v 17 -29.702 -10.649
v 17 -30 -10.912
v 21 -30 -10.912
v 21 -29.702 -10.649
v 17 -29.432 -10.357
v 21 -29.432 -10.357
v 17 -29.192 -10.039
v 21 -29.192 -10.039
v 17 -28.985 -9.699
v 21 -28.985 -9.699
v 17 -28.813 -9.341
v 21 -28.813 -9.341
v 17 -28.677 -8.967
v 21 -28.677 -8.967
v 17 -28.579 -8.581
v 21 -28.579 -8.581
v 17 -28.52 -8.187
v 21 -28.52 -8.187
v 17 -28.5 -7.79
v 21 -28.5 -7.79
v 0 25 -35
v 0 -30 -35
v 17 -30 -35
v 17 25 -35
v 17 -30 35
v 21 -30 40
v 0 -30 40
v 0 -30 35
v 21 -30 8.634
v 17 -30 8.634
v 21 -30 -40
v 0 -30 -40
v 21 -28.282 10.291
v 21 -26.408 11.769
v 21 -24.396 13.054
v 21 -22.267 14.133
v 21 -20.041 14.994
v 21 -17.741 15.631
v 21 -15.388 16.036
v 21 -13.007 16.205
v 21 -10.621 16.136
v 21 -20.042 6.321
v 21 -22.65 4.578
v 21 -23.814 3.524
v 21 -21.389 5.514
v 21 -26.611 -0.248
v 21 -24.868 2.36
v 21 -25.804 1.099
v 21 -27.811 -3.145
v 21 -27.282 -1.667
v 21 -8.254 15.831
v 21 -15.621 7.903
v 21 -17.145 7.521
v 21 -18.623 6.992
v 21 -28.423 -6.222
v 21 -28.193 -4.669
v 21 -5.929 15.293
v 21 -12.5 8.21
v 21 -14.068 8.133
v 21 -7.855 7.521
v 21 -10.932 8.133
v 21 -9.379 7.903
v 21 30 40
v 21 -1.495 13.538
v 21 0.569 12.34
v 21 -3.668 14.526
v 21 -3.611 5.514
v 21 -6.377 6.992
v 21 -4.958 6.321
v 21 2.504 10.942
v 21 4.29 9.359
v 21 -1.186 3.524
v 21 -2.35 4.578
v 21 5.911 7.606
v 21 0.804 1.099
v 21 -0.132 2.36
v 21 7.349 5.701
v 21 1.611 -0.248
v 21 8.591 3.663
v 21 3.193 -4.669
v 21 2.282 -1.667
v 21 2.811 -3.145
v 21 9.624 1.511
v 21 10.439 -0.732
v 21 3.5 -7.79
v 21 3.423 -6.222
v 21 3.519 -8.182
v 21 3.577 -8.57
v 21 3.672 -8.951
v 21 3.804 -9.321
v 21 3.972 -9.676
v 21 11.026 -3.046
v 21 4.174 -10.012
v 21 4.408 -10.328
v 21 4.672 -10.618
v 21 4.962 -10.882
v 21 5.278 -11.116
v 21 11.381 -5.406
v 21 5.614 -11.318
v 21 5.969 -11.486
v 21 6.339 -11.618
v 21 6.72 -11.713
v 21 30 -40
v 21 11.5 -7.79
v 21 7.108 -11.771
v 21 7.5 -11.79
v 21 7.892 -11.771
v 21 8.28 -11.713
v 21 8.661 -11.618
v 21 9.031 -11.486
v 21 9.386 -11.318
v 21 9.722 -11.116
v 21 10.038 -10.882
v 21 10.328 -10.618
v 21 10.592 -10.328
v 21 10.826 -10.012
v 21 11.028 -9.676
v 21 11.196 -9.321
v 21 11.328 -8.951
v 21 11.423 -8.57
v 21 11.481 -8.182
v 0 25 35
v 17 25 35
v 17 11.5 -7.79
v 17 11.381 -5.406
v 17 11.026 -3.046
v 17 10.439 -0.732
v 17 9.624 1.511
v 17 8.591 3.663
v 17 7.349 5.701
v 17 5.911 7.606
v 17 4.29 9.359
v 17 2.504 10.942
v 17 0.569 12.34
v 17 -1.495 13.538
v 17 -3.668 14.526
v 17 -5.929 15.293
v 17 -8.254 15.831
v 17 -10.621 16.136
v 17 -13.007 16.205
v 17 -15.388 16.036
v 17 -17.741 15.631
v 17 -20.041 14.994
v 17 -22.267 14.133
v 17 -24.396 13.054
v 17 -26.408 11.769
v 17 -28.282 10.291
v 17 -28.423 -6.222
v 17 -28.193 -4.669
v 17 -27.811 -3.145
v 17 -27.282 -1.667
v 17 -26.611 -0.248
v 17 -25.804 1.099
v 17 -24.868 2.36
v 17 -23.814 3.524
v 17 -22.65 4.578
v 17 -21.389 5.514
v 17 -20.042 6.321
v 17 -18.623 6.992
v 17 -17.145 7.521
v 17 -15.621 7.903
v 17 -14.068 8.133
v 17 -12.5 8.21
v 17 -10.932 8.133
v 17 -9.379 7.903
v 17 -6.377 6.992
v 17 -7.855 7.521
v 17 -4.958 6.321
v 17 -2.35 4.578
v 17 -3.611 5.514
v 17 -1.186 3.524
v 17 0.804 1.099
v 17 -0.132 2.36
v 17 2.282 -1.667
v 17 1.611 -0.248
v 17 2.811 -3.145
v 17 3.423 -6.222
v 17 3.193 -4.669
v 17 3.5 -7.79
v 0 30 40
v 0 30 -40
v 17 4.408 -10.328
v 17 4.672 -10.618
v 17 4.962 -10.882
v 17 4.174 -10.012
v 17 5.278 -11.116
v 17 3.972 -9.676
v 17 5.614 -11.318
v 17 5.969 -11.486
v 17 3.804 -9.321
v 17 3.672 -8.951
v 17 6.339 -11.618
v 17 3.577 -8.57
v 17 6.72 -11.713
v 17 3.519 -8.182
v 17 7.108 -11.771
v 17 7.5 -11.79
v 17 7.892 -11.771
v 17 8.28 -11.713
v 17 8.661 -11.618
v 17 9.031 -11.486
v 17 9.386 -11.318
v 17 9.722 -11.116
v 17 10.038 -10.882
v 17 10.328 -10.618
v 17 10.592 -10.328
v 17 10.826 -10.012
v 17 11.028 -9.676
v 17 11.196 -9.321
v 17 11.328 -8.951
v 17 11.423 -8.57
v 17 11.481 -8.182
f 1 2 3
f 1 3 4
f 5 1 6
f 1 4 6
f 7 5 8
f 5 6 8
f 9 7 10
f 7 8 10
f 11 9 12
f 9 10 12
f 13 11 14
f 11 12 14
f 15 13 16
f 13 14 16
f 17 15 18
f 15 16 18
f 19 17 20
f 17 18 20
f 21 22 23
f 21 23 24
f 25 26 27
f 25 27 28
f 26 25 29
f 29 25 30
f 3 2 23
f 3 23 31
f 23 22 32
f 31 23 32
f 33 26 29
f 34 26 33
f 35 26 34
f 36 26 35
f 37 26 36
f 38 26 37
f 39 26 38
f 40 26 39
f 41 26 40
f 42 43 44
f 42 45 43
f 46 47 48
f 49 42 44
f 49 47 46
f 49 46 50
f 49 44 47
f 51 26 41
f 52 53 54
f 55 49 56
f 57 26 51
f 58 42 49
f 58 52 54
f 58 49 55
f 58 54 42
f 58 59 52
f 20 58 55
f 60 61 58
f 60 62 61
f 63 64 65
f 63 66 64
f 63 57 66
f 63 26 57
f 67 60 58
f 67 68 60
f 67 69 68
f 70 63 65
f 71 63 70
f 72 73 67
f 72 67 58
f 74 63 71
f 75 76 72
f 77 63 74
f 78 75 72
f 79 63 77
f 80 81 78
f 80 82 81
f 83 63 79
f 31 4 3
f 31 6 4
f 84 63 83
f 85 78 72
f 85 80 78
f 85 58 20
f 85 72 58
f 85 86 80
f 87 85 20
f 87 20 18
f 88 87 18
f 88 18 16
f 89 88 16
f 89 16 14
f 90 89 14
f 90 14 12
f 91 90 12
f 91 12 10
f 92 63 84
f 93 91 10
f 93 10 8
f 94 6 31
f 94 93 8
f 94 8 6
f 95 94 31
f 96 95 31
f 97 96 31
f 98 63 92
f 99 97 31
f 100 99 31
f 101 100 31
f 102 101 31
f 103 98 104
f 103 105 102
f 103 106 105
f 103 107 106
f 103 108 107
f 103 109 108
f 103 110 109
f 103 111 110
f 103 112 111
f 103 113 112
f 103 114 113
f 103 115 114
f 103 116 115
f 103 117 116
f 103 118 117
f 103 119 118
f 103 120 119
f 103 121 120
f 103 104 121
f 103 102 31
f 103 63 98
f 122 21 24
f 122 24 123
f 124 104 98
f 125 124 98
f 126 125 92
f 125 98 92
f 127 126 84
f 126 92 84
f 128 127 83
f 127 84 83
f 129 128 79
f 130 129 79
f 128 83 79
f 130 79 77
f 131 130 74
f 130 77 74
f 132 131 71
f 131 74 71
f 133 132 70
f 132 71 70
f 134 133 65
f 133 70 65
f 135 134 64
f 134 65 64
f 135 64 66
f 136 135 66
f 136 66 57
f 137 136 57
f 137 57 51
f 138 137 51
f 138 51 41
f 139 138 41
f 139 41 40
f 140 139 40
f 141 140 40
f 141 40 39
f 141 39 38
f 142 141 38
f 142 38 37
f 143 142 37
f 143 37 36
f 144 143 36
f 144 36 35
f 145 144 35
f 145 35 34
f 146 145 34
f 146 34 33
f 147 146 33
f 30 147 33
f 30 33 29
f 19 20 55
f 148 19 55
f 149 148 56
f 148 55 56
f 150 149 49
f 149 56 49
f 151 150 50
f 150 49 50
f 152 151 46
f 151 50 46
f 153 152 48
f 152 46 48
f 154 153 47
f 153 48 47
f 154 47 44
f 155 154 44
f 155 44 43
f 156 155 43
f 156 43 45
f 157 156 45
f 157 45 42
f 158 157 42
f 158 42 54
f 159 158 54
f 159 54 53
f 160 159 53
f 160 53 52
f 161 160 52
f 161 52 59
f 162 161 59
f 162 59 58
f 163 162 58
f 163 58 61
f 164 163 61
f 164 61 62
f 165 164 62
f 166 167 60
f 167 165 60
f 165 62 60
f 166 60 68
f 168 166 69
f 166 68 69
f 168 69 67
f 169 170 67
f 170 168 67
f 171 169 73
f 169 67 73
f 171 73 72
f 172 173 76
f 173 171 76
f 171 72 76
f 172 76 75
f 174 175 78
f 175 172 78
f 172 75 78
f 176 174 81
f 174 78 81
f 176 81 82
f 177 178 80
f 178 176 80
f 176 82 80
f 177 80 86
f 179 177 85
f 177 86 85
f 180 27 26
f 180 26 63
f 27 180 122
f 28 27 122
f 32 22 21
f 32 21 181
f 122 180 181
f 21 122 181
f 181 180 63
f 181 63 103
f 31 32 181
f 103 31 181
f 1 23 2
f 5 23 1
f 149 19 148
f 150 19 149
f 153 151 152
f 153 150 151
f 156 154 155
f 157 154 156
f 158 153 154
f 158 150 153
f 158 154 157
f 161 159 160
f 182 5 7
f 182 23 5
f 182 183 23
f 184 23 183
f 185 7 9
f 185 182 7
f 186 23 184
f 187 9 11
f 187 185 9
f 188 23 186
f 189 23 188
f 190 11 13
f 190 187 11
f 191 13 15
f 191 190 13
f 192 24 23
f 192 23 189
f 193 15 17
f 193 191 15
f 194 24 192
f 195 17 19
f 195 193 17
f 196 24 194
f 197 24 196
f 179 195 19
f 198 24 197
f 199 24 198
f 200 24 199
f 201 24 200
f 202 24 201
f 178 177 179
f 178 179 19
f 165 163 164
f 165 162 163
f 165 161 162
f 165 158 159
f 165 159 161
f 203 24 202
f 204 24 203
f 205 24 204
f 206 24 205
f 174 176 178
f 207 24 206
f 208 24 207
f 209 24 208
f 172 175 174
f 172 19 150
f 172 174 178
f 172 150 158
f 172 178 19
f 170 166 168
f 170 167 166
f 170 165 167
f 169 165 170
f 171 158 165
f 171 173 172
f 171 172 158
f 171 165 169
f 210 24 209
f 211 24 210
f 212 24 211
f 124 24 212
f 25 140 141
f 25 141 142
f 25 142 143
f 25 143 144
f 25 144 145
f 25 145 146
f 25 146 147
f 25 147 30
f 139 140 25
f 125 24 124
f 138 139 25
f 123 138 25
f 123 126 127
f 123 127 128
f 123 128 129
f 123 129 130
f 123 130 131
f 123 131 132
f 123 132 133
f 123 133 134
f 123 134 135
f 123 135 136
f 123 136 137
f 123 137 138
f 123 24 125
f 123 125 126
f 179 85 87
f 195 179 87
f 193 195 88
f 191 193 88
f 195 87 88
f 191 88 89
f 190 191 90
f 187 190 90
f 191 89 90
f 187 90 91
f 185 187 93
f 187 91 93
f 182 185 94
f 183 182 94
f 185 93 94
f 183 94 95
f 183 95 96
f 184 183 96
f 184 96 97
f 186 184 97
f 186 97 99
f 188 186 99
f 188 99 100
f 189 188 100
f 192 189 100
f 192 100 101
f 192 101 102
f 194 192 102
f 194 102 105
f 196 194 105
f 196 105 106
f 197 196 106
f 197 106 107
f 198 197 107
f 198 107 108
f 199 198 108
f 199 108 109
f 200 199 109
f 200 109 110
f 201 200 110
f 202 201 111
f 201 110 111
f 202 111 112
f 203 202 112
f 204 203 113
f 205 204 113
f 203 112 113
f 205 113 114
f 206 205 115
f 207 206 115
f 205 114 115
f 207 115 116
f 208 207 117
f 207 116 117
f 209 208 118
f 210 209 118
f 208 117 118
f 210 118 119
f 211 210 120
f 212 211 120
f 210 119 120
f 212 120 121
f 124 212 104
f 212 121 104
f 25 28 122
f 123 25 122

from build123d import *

# Parameters (mm, degrees)
SKETCH1_W           = 80
SKETCH1_H           = 60
BOSS_EXTRUDE1_DEPTH = 21
CUT_EXTRUDE1_DEPTH  = 21
SKETCH3_W           = 70
SKETCH3_H           = 55
CUT_EXTRUDE2_DEPTH  = 17


with BuildPart() as part:
    # Sketch1 → Boss-Extrude1 (new body)
    with BuildSketch(Plane(origin=(0, 0, 0), x_dir=(0, 0, -1), z_dir=(1, 0, 0))):
        Rectangle(SKETCH1_W, SKETCH1_H)
    extrude(amount=BOSS_EXTRUDE1_DEPTH)

    # Sketch2 → Cut-Extrude1 (cut)
    with BuildSketch(Plane(origin=(21, 0, 0), x_dir=(0, 0, -1), z_dir=(1, 0, 0))):
        with BuildLine():
            ThreePointArc((7.79, 11.5), (-16.21, -12.5), (7.79, -36.5))
            ThreePointArc((7.79, -36.5), (11.79, -32.5), (7.79, -28.5))
            ThreePointArc((7.79, -28.5), (-8.21, -12.5), (7.79, 3.5))
            ThreePointArc((7.79, 3.5), (11.79, 7.5), (7.79, 11.5))
        make_face()
    extrude(amount=-CUT_EXTRUDE1_DEPTH, mode=Mode.SUBTRACT)

    # Sketch3 → Cut-Extrude2 (cut)
    with BuildSketch(Plane.ZY):
        with Locations((0, -2.5)):
            Rectangle(SKETCH3_W, SKETCH3_H)
    extrude(amount=-CUT_EXTRUDE2_DEPTH, mode=Mode.SUBTRACT)


solid = part.part
